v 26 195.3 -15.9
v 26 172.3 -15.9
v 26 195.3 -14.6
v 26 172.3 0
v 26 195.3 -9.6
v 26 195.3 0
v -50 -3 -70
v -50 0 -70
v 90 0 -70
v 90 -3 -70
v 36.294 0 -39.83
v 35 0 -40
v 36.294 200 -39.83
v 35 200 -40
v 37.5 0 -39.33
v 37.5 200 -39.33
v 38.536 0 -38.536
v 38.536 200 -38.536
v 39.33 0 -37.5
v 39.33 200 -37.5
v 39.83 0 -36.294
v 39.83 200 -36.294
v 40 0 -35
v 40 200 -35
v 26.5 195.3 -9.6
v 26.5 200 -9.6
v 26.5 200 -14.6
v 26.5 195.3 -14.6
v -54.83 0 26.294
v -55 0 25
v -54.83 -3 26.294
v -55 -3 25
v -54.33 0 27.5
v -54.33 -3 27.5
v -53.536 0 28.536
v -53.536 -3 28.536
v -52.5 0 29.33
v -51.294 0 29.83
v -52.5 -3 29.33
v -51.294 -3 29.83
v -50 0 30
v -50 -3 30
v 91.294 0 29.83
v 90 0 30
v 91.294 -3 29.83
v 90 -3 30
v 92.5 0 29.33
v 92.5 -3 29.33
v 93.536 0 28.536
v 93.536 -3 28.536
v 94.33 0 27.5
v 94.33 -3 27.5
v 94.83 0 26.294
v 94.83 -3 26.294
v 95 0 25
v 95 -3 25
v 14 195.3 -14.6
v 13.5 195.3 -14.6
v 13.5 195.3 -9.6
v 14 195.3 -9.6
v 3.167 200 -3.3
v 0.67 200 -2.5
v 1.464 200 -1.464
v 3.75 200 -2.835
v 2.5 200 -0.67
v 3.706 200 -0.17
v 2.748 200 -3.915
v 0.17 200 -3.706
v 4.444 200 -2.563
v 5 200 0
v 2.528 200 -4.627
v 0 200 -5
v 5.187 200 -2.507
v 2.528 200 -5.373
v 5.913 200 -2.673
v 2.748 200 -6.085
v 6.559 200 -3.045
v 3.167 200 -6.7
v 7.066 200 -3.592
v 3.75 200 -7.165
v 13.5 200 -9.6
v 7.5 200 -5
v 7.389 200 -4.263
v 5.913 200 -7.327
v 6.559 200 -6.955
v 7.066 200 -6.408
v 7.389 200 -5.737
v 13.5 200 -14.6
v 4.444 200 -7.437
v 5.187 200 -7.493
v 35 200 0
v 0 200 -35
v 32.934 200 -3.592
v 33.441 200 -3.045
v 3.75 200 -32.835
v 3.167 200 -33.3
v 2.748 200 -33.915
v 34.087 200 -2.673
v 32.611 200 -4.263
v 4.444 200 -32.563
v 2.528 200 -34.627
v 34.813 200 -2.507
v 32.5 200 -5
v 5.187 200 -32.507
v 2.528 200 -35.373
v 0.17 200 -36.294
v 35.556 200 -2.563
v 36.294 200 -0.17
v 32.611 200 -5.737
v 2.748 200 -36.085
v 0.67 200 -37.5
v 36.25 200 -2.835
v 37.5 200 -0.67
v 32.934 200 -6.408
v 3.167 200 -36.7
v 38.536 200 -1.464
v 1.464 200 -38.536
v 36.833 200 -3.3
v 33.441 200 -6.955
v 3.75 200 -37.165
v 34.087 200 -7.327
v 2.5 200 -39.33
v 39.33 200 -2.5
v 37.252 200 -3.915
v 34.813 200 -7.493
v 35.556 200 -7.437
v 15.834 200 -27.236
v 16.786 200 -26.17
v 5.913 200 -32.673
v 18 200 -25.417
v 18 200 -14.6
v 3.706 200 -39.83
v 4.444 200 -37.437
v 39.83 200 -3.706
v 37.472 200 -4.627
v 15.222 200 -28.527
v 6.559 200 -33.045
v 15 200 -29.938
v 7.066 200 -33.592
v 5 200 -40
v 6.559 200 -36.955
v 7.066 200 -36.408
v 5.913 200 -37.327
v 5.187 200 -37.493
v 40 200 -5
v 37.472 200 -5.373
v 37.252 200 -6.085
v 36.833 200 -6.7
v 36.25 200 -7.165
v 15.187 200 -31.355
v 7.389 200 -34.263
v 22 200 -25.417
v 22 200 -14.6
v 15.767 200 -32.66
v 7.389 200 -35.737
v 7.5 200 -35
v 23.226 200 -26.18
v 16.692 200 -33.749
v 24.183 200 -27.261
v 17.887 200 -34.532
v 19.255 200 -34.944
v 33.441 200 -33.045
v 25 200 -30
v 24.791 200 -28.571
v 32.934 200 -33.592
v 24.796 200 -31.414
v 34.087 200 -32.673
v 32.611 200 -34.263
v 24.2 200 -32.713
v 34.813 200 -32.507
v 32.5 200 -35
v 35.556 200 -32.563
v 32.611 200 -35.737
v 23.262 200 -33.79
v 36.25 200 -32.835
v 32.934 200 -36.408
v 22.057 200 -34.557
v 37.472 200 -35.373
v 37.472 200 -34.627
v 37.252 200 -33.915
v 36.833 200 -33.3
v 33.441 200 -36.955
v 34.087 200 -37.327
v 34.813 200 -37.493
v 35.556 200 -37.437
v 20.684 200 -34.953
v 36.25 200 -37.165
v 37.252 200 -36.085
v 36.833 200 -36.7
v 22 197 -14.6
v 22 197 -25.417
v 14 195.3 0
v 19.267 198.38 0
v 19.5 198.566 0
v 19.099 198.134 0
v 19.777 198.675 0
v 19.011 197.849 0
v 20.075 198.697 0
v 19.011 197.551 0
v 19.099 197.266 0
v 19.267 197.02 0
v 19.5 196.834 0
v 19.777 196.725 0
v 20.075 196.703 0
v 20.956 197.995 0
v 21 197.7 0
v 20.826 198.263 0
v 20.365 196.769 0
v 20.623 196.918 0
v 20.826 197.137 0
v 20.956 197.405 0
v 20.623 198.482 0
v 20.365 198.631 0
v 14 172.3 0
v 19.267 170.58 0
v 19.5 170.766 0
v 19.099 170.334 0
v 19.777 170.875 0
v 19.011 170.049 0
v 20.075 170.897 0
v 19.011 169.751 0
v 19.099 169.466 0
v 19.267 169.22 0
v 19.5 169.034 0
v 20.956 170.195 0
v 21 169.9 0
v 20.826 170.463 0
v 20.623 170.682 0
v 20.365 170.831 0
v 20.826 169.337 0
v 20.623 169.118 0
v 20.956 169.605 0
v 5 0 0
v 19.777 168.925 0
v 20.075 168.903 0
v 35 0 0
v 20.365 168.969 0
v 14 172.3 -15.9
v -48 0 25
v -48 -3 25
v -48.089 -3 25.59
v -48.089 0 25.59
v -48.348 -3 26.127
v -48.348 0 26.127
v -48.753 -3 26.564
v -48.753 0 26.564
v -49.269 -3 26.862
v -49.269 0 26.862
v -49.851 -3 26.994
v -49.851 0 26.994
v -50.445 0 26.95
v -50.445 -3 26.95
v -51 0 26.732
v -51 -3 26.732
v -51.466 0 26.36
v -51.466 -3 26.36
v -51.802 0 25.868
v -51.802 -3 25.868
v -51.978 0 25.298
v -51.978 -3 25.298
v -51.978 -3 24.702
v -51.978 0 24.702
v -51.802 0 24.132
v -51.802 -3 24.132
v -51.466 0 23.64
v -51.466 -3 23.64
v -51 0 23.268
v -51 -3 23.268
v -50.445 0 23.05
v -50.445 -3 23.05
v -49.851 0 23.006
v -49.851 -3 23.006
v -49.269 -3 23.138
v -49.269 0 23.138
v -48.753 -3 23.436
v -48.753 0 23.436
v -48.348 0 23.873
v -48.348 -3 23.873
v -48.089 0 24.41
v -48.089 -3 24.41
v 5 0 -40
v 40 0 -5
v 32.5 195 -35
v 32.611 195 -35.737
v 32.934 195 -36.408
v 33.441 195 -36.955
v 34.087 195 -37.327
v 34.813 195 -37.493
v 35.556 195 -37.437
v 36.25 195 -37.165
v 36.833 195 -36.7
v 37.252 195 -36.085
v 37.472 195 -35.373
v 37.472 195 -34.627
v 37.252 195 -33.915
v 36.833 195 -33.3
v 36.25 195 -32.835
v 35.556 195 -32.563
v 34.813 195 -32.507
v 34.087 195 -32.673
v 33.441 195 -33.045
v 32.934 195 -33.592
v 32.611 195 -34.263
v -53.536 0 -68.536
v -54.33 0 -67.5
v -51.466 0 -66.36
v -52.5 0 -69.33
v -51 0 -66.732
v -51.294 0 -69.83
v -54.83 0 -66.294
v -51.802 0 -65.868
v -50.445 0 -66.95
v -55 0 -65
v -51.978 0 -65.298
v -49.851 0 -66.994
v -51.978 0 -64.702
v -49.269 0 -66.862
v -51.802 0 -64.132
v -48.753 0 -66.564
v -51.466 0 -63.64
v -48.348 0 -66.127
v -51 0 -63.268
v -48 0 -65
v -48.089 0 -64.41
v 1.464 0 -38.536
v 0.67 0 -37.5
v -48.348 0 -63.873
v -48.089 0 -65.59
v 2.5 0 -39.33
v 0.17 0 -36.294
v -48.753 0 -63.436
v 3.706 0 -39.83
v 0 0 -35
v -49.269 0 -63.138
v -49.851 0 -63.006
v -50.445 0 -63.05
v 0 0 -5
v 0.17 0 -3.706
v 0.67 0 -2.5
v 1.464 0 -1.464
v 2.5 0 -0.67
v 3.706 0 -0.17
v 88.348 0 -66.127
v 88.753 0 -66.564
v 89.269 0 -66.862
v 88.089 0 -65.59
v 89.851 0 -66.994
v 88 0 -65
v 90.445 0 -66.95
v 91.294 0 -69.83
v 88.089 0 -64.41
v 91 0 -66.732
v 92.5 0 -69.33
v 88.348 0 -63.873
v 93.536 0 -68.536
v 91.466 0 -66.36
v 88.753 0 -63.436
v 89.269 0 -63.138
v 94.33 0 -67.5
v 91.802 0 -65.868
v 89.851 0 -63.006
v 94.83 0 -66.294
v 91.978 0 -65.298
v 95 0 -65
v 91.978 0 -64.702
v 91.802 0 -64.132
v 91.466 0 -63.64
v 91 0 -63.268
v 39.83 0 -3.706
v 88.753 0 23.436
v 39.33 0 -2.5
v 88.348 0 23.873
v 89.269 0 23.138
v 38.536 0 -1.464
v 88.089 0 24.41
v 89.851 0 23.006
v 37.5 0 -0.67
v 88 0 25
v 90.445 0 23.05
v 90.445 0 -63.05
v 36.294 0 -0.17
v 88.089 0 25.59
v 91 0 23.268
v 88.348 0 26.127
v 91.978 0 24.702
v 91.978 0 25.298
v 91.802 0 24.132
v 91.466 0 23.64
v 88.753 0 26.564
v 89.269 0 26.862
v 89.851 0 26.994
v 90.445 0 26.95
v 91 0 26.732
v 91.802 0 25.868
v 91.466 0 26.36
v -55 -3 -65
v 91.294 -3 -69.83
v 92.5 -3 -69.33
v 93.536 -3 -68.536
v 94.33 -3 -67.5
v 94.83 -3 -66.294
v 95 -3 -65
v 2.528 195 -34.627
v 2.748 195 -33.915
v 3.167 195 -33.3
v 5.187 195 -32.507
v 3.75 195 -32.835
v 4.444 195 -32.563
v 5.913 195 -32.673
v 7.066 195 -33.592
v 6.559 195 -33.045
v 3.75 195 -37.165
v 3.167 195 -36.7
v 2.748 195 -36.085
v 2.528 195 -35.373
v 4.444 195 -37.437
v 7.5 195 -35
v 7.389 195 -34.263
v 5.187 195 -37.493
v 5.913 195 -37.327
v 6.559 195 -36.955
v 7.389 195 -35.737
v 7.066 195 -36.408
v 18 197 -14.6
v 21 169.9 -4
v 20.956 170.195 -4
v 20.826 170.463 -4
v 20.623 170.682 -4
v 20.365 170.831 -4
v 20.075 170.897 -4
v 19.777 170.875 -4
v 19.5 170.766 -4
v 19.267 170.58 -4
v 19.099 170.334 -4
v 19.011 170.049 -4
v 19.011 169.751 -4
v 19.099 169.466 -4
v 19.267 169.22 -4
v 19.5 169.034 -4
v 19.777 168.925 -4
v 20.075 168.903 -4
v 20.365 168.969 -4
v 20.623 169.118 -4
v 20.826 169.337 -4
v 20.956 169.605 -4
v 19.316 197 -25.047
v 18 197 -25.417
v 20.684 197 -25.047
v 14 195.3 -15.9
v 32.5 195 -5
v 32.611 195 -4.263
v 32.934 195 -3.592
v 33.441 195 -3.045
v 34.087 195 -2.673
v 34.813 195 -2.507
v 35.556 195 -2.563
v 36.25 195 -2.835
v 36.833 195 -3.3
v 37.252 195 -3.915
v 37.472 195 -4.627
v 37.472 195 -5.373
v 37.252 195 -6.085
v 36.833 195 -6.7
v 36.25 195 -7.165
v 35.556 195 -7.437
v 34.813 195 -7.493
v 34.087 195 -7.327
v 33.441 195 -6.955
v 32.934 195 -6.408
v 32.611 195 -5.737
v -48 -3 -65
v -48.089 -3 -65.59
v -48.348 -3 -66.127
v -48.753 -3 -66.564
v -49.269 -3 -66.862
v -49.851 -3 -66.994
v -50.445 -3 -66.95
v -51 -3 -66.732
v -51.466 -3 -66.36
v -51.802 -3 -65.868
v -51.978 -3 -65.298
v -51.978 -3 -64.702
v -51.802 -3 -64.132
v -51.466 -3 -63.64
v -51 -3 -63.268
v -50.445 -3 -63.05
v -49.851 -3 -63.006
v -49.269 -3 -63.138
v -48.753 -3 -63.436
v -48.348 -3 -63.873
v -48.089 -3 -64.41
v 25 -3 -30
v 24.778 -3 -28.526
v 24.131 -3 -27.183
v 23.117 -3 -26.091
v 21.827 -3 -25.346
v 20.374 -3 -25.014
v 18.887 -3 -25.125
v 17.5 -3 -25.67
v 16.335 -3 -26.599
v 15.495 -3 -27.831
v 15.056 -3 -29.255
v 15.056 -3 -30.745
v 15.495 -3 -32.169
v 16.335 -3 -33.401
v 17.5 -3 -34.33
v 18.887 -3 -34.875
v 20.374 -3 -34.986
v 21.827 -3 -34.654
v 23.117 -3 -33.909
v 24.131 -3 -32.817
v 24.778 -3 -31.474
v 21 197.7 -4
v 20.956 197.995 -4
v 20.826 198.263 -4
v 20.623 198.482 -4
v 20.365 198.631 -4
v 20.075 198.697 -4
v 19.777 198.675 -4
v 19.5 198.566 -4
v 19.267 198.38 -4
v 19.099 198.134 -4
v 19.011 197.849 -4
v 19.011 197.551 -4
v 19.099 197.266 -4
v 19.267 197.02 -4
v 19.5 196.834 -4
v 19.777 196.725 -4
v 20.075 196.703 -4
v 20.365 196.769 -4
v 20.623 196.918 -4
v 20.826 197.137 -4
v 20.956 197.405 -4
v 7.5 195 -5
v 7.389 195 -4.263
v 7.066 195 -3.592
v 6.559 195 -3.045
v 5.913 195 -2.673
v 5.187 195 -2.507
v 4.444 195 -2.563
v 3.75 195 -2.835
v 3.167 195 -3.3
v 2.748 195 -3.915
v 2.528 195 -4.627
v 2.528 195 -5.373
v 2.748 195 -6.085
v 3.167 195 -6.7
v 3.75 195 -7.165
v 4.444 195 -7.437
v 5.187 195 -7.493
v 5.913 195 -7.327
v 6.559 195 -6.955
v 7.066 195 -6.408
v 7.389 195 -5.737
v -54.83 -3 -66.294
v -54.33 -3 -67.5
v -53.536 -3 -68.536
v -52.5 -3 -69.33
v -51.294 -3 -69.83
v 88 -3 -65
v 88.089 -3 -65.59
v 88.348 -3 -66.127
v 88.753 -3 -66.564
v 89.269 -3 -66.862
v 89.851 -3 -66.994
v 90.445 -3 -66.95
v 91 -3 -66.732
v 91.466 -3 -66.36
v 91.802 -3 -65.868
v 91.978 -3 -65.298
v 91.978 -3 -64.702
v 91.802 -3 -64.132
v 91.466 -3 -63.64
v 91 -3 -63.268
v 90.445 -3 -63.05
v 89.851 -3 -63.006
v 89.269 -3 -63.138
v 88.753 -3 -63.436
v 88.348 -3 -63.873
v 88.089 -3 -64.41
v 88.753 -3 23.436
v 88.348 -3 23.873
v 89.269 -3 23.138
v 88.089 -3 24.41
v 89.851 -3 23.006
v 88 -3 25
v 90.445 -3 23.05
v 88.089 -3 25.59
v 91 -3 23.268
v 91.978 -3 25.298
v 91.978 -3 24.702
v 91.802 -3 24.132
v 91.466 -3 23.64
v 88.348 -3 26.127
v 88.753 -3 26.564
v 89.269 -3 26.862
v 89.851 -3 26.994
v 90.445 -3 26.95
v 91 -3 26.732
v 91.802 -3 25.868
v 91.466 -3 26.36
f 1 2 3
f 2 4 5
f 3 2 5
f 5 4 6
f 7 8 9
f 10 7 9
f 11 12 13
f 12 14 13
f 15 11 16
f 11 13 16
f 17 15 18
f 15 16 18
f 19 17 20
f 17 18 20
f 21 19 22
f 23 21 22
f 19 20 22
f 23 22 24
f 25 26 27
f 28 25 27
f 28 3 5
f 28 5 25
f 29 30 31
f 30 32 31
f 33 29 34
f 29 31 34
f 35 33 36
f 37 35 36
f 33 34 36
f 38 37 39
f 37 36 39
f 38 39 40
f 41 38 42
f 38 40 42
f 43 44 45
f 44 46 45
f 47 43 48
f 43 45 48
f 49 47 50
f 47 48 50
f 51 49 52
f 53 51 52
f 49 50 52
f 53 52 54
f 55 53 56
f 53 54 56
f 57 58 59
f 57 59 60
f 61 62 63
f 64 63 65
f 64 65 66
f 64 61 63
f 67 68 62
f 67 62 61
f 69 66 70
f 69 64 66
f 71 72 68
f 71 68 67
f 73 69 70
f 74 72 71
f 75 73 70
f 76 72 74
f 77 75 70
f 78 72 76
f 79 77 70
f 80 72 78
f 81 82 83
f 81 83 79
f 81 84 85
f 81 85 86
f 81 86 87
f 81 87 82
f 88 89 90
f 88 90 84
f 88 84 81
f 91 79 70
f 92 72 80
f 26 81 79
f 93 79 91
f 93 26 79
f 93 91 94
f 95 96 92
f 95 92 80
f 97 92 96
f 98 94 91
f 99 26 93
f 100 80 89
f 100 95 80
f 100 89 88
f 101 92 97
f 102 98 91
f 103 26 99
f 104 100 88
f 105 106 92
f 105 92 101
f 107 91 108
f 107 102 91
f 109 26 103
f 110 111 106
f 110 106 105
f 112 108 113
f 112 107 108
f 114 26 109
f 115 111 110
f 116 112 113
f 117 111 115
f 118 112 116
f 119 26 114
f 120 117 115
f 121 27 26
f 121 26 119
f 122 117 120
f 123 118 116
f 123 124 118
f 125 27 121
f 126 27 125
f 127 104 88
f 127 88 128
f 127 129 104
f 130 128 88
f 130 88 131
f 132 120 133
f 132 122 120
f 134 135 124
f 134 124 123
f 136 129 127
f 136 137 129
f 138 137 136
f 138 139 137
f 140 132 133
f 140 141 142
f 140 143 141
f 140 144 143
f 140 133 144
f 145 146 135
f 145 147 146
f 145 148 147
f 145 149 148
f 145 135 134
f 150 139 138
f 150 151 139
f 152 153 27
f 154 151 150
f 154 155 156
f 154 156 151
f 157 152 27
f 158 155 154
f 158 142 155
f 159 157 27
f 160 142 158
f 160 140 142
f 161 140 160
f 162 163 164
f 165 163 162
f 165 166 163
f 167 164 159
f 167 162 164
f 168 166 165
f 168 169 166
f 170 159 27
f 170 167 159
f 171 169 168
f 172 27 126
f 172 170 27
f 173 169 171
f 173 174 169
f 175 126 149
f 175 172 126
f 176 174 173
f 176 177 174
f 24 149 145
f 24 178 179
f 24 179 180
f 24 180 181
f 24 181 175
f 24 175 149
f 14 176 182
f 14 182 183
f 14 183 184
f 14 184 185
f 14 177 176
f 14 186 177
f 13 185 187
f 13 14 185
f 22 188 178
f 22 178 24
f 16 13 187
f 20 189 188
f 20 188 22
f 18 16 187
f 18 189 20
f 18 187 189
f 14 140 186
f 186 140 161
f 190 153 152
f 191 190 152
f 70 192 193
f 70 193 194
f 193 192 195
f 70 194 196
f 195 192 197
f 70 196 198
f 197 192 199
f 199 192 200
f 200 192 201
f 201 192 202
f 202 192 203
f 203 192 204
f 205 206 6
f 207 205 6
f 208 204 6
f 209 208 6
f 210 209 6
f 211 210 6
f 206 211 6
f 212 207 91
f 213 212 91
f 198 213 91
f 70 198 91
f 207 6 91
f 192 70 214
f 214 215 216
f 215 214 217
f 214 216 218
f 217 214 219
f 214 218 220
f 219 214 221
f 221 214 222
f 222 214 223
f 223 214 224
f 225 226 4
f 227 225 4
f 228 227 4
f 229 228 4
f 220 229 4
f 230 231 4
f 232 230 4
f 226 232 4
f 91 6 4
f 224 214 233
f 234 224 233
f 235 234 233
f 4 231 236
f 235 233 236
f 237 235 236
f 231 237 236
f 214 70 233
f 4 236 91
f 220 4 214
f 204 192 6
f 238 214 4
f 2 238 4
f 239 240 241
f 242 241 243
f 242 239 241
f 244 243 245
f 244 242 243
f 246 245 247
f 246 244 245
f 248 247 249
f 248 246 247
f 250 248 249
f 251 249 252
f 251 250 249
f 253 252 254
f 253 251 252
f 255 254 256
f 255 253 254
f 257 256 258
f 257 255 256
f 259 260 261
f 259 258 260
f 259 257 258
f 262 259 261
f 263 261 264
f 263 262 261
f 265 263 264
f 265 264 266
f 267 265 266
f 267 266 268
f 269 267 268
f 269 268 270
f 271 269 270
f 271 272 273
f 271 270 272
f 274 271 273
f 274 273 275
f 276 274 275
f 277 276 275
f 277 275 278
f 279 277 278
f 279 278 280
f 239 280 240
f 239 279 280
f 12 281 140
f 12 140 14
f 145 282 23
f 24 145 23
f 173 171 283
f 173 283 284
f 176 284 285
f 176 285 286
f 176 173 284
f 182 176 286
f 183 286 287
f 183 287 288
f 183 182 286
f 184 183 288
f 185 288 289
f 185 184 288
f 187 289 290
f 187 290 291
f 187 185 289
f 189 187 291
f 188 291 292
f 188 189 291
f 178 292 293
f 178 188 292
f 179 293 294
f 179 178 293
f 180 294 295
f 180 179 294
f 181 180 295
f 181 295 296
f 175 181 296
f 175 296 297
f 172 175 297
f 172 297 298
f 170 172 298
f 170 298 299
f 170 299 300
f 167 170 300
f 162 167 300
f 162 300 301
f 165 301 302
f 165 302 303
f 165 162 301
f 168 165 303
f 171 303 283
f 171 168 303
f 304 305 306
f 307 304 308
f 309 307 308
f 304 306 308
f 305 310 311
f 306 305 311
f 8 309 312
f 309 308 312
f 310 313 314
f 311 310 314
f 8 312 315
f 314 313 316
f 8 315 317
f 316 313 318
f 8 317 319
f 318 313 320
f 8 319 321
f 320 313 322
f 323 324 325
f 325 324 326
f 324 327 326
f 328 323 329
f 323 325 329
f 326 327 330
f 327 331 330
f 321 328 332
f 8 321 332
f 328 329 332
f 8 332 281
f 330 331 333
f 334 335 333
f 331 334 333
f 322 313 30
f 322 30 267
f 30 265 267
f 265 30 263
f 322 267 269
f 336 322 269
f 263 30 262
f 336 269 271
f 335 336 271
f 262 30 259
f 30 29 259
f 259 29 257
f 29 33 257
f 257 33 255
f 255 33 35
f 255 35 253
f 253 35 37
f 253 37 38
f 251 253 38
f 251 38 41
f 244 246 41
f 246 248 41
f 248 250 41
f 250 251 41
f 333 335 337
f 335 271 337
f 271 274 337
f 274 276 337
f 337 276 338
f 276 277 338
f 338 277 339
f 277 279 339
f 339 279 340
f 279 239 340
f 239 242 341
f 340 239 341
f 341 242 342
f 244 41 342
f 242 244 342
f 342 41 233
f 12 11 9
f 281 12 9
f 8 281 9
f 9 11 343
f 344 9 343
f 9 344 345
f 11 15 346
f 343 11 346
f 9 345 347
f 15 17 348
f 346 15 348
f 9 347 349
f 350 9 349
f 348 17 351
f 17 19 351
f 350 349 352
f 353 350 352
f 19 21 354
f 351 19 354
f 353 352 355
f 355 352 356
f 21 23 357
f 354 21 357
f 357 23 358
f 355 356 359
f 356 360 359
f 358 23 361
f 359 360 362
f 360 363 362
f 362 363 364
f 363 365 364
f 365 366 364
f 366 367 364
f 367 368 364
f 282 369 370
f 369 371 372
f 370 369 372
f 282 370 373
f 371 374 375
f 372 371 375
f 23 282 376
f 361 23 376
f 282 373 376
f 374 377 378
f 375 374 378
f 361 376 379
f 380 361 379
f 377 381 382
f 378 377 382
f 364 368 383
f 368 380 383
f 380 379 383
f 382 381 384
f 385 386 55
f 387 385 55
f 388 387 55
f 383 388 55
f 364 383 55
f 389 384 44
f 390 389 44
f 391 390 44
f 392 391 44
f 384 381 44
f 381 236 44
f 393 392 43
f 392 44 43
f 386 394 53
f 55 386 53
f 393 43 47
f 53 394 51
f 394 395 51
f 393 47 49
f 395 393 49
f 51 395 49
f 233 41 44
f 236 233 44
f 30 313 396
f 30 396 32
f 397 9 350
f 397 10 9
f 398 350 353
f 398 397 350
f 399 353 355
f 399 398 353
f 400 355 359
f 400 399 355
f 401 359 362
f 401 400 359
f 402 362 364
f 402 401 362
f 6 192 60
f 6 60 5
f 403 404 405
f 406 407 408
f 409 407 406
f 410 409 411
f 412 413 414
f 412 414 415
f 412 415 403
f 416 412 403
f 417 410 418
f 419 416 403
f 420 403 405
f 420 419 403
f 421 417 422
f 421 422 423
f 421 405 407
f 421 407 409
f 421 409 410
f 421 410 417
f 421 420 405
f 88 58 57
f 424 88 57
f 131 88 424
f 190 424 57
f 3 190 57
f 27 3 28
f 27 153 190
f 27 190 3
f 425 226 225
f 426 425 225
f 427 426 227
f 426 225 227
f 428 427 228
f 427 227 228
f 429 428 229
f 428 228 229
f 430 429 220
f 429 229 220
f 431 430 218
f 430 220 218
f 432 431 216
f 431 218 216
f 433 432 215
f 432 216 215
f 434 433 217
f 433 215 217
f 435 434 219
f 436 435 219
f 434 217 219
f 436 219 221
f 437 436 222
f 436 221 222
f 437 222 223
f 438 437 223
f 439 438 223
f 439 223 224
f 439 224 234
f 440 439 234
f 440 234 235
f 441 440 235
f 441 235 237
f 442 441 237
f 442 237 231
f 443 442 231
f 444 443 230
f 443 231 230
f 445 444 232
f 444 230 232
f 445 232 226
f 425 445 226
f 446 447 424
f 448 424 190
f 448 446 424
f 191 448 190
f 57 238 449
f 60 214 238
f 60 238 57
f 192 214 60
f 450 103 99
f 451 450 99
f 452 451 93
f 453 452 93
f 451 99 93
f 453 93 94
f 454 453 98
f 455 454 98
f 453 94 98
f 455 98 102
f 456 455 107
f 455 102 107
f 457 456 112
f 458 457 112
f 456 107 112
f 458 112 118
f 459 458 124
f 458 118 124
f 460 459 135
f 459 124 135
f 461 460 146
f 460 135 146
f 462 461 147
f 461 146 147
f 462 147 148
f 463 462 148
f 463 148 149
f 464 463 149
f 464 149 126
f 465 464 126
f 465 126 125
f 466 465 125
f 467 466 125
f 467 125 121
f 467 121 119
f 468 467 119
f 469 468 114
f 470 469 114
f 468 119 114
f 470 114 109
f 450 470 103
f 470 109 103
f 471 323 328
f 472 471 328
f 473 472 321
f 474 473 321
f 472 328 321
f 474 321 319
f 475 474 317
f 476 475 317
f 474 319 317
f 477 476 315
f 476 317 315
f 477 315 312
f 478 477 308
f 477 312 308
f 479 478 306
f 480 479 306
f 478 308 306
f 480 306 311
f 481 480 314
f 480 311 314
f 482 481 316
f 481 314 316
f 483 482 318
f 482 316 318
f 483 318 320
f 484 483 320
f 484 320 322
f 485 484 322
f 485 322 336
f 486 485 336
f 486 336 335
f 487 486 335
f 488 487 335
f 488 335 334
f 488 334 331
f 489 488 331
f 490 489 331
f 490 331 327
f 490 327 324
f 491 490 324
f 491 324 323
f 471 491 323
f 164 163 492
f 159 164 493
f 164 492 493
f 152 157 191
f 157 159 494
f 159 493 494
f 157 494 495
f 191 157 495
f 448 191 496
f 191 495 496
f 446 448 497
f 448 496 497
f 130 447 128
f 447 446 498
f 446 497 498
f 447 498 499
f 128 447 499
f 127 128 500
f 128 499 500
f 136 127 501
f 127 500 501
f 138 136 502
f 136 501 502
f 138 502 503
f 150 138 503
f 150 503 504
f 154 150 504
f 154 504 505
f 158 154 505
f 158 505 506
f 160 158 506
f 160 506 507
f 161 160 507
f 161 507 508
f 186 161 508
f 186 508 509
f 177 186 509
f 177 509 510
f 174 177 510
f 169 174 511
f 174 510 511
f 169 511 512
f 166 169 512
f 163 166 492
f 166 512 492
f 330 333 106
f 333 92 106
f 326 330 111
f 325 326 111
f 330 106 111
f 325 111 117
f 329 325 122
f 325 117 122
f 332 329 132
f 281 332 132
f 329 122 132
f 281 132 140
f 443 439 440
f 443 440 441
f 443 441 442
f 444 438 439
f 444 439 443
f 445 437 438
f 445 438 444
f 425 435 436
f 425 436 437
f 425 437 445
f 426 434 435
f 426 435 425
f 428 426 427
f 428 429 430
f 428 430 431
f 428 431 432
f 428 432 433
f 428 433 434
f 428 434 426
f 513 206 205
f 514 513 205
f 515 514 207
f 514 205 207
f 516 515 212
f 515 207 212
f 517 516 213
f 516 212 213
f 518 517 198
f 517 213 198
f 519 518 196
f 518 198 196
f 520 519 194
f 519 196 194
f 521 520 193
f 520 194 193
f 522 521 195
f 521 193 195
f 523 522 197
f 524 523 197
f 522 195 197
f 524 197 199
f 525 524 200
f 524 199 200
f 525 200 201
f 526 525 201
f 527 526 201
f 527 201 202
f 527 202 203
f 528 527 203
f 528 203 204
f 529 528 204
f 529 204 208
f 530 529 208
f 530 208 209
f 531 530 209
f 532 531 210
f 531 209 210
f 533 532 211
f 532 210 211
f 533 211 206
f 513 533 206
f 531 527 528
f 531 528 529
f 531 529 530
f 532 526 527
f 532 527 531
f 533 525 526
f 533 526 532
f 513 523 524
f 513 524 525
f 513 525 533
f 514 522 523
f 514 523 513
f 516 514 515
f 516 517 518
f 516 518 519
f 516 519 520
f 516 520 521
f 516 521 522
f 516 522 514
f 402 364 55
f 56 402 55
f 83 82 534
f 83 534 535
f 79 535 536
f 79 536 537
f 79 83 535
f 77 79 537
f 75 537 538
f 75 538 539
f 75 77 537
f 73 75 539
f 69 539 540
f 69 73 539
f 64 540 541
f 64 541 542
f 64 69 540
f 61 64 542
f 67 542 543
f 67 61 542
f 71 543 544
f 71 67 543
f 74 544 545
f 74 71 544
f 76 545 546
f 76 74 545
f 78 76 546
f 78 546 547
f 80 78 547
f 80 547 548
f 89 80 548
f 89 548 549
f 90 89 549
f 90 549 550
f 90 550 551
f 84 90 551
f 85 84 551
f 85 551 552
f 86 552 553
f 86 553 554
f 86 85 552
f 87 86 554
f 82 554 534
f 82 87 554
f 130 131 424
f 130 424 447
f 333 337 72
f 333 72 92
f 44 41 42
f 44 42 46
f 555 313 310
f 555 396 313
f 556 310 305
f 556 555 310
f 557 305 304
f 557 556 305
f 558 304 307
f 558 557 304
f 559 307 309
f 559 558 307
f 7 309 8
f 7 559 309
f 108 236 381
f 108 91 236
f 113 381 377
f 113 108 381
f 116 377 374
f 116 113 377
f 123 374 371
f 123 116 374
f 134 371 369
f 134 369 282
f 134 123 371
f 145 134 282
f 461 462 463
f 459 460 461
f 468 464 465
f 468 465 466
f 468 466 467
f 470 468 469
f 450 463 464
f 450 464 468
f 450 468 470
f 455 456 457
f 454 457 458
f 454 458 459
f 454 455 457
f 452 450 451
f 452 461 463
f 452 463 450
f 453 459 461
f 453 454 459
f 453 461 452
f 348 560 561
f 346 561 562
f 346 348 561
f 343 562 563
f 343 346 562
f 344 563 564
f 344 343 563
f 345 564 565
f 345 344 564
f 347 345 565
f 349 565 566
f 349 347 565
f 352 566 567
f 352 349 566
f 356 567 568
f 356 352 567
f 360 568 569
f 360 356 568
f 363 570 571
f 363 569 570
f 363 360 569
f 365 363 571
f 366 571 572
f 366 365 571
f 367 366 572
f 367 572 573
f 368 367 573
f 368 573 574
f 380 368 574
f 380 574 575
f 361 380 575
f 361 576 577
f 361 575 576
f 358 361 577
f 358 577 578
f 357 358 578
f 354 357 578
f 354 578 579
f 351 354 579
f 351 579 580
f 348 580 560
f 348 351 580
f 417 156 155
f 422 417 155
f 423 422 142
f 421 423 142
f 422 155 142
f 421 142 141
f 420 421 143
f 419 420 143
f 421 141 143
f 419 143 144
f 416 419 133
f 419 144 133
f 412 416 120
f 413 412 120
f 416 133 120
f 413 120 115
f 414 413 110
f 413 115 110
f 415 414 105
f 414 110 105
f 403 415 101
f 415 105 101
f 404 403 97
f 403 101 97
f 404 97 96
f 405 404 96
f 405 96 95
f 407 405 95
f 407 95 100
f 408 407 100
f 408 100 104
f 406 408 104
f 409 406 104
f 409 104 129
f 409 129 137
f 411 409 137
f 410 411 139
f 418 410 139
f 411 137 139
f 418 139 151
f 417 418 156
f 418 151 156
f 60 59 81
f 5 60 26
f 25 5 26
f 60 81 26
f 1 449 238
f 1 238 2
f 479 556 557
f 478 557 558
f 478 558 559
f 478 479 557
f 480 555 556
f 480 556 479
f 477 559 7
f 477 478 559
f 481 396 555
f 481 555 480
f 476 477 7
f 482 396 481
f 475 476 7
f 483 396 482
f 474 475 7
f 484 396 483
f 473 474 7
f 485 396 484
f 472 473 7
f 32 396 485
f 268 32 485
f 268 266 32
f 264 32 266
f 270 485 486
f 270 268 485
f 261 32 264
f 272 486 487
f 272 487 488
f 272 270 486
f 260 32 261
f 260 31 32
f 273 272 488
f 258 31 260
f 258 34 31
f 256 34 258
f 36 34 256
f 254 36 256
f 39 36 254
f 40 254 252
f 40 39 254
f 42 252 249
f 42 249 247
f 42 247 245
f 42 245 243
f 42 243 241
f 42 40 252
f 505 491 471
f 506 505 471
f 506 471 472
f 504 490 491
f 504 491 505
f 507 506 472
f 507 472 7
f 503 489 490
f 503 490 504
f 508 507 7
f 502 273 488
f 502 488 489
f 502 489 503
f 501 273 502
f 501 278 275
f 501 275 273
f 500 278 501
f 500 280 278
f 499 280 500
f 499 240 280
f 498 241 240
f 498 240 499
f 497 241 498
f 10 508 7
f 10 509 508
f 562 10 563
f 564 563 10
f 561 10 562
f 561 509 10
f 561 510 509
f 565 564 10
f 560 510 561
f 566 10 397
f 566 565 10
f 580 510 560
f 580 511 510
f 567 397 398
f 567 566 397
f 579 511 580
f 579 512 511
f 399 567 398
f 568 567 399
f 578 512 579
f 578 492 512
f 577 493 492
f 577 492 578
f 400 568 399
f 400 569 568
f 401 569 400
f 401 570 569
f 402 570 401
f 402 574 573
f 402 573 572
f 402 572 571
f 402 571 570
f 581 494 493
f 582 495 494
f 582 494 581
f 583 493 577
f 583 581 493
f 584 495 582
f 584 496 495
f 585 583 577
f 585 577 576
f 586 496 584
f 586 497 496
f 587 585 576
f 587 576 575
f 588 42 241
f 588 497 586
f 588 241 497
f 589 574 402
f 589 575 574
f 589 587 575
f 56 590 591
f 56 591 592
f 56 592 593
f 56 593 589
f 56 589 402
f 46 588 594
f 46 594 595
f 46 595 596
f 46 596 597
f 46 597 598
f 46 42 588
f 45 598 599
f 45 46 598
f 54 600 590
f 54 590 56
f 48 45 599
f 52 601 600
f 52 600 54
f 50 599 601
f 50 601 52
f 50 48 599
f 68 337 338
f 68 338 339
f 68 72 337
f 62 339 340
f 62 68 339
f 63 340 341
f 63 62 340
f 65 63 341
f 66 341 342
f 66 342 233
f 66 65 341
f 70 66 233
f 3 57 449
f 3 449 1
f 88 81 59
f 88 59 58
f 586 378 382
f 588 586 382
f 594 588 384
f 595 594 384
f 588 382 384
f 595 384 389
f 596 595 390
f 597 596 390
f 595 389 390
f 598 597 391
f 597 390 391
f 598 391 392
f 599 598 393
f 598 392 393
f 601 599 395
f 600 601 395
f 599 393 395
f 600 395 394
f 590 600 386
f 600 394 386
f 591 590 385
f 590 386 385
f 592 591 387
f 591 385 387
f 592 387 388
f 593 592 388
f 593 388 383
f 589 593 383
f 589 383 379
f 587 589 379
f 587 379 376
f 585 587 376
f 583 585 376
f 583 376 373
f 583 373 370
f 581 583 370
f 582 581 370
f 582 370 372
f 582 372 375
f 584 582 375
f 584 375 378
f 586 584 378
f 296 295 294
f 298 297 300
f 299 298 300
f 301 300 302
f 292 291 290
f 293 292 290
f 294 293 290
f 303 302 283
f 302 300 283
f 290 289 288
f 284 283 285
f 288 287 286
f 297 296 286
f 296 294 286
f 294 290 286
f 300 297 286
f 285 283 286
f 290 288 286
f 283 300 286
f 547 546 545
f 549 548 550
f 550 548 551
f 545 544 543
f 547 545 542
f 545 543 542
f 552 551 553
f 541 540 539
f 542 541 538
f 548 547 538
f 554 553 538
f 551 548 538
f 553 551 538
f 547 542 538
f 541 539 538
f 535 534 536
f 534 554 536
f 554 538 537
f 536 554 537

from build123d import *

# Parameters (mm, degrees)
SKETCH1_W               = 40
SKETCH1_H               = 40
BOSS_EXTRUDE1_DEPTH     = 200
SKETCH2_W               = 12
SKETCH2_H               = 23
CUT_EXTRUDE1_DEPTH      = 15.9
SKETCH3_R               = 1
CUT_EXTRUDE2_DEPTH      = 4
SKETCH4_R               = 5
CUT_EXTRUDE3_DEPTH      = 201
SKETCH5_W               = 13
SKETCH5_H               = 5
CUT_EXTRUDE4_DEPTH      = 4.7
SKETCH6_W               = 4
SKETCH6_H               = 10.817424305
CUT_EXTRUDE5_DEPTH      = 3
FILLET1_R               = 5
SKETCH7_W               = 150
SKETCH7_H               = 100
BOSS_EXTRUDE2_DEPTH     = 3
SKETCH9_R               = 5
CUT_EXTRUDE6_DEPTH      = 3
SKETCH10_R              = 2
CUT_EXTRUDE7_DEPTH      = 4
MIRROR2_COPY_1_SKETCH_R = 2
MIRROR2_COPY_1_DEPTH    = 4
SKETCH11_R              = 2.5
CUT_EXTRUDE8_DEPTH      = 5
MIRROR4_COPY_1_SKETCH_R = 2.5
MIRROR4_COPY_1_DEPTH    = 5
FILLET2_R               = 5


with BuildPart() as part:
    # Sketch1 → Boss-Extrude1 (new body)
    with BuildSketch(Plane(origin=(0, 0, 0), x_dir=(1, 0, 0), z_dir=(0, 1, 0))):
        with Locations((20, 20)):
            Rectangle(SKETCH1_W, SKETCH1_H)
    extrude(amount=BOSS_EXTRUDE1_DEPTH)

    # Sketch2 → Cut-Extrude1 (cut)
    with BuildSketch(Plane.XY):
        with Locations((20, 183.8)):
            Rectangle(SKETCH2_W, SKETCH2_H)
    extrude(amount=-CUT_EXTRUDE1_DEPTH, mode=Mode.SUBTRACT)

    # Sketch3 → Cut-Extrude2 (cut)
    with BuildSketch(Plane.XY):
        with Locations((20, 197.7)):
            Circle(SKETCH3_R)
        with Locations((20, 169.9)):
            Circle(SKETCH3_R)
    extrude(amount=-CUT_EXTRUDE2_DEPTH, mode=Mode.SUBTRACT)

    # Sketch4 → Cut-Extrude3 (cut, through all)
    with BuildSketch(Plane(origin=(0, 200, 0), x_dir=(1, 0, 0), z_dir=(0, 1, 0))):
        with Locations((20, 30)):
            Circle(SKETCH4_R)
    extrude(amount=-CUT_EXTRUDE3_DEPTH, mode=Mode.SUBTRACT)

    # Sketch5 → Cut-Extrude4 (cut)
    with BuildSketch(Plane(origin=(0, 200, 0), x_dir=(1, 0, 0), z_dir=(0, 1, 0))):
        with Locations((20, 12.1)):
            Rectangle(SKETCH5_W, SKETCH5_H)
    extrude(amount=-CUT_EXTRUDE4_DEPTH, mode=Mode.SUBTRACT)

    # Sketch6 → Cut-Extrude5 (cut)
    with BuildSketch(Plane(origin=(0, 200, 0), x_dir=(1, 0, 0), z_dir=(0, 1, 0))):
        with Locations((20, 20.008712153)):
            Rectangle(SKETCH6_W, SKETCH6_H)
    extrude(amount=-CUT_EXTRUDE5_DEPTH, mode=Mode.SUBTRACT)

    # Fillet1
    fillet1_edges = [part.edges().sort_by_distance(p)[0] for p in [
        (0, 100, -40),
        (40, 100, -40),
        (40, 100, 0),
        (0, 100, 0),
    ]]
    fillet(fillet1_edges, radius=FILLET1_R)

    # Sketch7 → Boss-Extrude2 (add)
    with BuildSketch(Plane.XZ):
        with Locations((20, -20)):
            Rectangle(SKETCH7_W, SKETCH7_H)
    extrude(amount=BOSS_EXTRUDE2_DEPTH)

    # Sketch9 → Cut-Extrude6 (cut)
    with BuildSketch(Plane.XZ.offset(3)):
        with Locations((20, -30)):
            Circle(SKETCH9_R)
    extrude(amount=-CUT_EXTRUDE6_DEPTH, mode=Mode.SUBTRACT)

    # Sketch10 → Cut-Extrude7 (cut, through all)
    with BuildSketch(Plane(origin=(0, 0, 0), x_dir=(1, 0, 0), z_dir=(0, 1, 0))):
        with Locations((-50, 65)):
            Circle(SKETCH10_R)
    cut_extrude7 = extrude(amount=-CUT_EXTRUDE7_DEPTH, mode=Mode.SUBTRACT)

    # Mirror1: Cut-Extrude7 across plane
    add(cut_extrude7.mirror(Plane.ZY.offset(-20)), mode=Mode.SUBTRACT)

    # Mirror2: Cut-Extrude7 across plane
    add(cut_extrude7.mirror(Plane(origin=(0, 0, -20), x_dir=(1, 0, 0), z_dir=(0, 0, -1))), mode=Mode.SUBTRACT)

    # Mirror2 copy 1 sketch → Mirror2 copy 1 (cut, through all)
    with BuildSketch(Plane(origin=(40, 0, -40), x_dir=(-1, 0, 0), z_dir=(0, 1, 0))):
        with Locations((-50, 65)):
            Circle(MIRROR2_COPY_1_SKETCH_R)
    extrude(amount=-MIRROR2_COPY_1_DEPTH, mode=Mode.SUBTRACT)

    # Sketch11 → Cut-Extrude8 (cut)
    with BuildSketch(Plane(origin=(0, 200, 0), x_dir=(1, 0, 0), z_dir=(0, 1, 0))):
        with Locations((5, 35)):
            Circle(SKETCH11_R)
    cut_extrude8 = extrude(amount=-CUT_EXTRUDE8_DEPTH, mode=Mode.SUBTRACT)

    # Mirror3: Cut-Extrude8 across plane
    add(cut_extrude8.mirror(Plane(origin=(0, 0, -20), x_dir=(1, 0, 0), z_dir=(0, 0, -1))), mode=Mode.SUBTRACT)

    # Mirror4: Cut-Extrude8 across plane
    add(cut_extrude8.mirror(Plane.ZY.offset(-20)), mode=Mode.SUBTRACT)

    # Mirror4 copy 1 sketch → Mirror4 copy 1 (cut)
    with BuildSketch(Plane(origin=(40, 200, -40), x_dir=(-1, 0, 0), z_dir=(0, 1, 0))):
        with Locations((5, 35)):
            Circle(MIRROR4_COPY_1_SKETCH_R)
    extrude(amount=-MIRROR4_COPY_1_DEPTH, mode=Mode.SUBTRACT)

    # Fillet2
    fillet2_edges = [part.edges().sort_by_distance(p)[0] for p in [
        (-55, -1.5, 30),
        (-55, -1.5, -70),
        (95, -1.5, -70),
        (95, -1.5, 30),
    ]]
    fillet(fillet2_edges, radius=FILLET2_R)


solid = part.part
